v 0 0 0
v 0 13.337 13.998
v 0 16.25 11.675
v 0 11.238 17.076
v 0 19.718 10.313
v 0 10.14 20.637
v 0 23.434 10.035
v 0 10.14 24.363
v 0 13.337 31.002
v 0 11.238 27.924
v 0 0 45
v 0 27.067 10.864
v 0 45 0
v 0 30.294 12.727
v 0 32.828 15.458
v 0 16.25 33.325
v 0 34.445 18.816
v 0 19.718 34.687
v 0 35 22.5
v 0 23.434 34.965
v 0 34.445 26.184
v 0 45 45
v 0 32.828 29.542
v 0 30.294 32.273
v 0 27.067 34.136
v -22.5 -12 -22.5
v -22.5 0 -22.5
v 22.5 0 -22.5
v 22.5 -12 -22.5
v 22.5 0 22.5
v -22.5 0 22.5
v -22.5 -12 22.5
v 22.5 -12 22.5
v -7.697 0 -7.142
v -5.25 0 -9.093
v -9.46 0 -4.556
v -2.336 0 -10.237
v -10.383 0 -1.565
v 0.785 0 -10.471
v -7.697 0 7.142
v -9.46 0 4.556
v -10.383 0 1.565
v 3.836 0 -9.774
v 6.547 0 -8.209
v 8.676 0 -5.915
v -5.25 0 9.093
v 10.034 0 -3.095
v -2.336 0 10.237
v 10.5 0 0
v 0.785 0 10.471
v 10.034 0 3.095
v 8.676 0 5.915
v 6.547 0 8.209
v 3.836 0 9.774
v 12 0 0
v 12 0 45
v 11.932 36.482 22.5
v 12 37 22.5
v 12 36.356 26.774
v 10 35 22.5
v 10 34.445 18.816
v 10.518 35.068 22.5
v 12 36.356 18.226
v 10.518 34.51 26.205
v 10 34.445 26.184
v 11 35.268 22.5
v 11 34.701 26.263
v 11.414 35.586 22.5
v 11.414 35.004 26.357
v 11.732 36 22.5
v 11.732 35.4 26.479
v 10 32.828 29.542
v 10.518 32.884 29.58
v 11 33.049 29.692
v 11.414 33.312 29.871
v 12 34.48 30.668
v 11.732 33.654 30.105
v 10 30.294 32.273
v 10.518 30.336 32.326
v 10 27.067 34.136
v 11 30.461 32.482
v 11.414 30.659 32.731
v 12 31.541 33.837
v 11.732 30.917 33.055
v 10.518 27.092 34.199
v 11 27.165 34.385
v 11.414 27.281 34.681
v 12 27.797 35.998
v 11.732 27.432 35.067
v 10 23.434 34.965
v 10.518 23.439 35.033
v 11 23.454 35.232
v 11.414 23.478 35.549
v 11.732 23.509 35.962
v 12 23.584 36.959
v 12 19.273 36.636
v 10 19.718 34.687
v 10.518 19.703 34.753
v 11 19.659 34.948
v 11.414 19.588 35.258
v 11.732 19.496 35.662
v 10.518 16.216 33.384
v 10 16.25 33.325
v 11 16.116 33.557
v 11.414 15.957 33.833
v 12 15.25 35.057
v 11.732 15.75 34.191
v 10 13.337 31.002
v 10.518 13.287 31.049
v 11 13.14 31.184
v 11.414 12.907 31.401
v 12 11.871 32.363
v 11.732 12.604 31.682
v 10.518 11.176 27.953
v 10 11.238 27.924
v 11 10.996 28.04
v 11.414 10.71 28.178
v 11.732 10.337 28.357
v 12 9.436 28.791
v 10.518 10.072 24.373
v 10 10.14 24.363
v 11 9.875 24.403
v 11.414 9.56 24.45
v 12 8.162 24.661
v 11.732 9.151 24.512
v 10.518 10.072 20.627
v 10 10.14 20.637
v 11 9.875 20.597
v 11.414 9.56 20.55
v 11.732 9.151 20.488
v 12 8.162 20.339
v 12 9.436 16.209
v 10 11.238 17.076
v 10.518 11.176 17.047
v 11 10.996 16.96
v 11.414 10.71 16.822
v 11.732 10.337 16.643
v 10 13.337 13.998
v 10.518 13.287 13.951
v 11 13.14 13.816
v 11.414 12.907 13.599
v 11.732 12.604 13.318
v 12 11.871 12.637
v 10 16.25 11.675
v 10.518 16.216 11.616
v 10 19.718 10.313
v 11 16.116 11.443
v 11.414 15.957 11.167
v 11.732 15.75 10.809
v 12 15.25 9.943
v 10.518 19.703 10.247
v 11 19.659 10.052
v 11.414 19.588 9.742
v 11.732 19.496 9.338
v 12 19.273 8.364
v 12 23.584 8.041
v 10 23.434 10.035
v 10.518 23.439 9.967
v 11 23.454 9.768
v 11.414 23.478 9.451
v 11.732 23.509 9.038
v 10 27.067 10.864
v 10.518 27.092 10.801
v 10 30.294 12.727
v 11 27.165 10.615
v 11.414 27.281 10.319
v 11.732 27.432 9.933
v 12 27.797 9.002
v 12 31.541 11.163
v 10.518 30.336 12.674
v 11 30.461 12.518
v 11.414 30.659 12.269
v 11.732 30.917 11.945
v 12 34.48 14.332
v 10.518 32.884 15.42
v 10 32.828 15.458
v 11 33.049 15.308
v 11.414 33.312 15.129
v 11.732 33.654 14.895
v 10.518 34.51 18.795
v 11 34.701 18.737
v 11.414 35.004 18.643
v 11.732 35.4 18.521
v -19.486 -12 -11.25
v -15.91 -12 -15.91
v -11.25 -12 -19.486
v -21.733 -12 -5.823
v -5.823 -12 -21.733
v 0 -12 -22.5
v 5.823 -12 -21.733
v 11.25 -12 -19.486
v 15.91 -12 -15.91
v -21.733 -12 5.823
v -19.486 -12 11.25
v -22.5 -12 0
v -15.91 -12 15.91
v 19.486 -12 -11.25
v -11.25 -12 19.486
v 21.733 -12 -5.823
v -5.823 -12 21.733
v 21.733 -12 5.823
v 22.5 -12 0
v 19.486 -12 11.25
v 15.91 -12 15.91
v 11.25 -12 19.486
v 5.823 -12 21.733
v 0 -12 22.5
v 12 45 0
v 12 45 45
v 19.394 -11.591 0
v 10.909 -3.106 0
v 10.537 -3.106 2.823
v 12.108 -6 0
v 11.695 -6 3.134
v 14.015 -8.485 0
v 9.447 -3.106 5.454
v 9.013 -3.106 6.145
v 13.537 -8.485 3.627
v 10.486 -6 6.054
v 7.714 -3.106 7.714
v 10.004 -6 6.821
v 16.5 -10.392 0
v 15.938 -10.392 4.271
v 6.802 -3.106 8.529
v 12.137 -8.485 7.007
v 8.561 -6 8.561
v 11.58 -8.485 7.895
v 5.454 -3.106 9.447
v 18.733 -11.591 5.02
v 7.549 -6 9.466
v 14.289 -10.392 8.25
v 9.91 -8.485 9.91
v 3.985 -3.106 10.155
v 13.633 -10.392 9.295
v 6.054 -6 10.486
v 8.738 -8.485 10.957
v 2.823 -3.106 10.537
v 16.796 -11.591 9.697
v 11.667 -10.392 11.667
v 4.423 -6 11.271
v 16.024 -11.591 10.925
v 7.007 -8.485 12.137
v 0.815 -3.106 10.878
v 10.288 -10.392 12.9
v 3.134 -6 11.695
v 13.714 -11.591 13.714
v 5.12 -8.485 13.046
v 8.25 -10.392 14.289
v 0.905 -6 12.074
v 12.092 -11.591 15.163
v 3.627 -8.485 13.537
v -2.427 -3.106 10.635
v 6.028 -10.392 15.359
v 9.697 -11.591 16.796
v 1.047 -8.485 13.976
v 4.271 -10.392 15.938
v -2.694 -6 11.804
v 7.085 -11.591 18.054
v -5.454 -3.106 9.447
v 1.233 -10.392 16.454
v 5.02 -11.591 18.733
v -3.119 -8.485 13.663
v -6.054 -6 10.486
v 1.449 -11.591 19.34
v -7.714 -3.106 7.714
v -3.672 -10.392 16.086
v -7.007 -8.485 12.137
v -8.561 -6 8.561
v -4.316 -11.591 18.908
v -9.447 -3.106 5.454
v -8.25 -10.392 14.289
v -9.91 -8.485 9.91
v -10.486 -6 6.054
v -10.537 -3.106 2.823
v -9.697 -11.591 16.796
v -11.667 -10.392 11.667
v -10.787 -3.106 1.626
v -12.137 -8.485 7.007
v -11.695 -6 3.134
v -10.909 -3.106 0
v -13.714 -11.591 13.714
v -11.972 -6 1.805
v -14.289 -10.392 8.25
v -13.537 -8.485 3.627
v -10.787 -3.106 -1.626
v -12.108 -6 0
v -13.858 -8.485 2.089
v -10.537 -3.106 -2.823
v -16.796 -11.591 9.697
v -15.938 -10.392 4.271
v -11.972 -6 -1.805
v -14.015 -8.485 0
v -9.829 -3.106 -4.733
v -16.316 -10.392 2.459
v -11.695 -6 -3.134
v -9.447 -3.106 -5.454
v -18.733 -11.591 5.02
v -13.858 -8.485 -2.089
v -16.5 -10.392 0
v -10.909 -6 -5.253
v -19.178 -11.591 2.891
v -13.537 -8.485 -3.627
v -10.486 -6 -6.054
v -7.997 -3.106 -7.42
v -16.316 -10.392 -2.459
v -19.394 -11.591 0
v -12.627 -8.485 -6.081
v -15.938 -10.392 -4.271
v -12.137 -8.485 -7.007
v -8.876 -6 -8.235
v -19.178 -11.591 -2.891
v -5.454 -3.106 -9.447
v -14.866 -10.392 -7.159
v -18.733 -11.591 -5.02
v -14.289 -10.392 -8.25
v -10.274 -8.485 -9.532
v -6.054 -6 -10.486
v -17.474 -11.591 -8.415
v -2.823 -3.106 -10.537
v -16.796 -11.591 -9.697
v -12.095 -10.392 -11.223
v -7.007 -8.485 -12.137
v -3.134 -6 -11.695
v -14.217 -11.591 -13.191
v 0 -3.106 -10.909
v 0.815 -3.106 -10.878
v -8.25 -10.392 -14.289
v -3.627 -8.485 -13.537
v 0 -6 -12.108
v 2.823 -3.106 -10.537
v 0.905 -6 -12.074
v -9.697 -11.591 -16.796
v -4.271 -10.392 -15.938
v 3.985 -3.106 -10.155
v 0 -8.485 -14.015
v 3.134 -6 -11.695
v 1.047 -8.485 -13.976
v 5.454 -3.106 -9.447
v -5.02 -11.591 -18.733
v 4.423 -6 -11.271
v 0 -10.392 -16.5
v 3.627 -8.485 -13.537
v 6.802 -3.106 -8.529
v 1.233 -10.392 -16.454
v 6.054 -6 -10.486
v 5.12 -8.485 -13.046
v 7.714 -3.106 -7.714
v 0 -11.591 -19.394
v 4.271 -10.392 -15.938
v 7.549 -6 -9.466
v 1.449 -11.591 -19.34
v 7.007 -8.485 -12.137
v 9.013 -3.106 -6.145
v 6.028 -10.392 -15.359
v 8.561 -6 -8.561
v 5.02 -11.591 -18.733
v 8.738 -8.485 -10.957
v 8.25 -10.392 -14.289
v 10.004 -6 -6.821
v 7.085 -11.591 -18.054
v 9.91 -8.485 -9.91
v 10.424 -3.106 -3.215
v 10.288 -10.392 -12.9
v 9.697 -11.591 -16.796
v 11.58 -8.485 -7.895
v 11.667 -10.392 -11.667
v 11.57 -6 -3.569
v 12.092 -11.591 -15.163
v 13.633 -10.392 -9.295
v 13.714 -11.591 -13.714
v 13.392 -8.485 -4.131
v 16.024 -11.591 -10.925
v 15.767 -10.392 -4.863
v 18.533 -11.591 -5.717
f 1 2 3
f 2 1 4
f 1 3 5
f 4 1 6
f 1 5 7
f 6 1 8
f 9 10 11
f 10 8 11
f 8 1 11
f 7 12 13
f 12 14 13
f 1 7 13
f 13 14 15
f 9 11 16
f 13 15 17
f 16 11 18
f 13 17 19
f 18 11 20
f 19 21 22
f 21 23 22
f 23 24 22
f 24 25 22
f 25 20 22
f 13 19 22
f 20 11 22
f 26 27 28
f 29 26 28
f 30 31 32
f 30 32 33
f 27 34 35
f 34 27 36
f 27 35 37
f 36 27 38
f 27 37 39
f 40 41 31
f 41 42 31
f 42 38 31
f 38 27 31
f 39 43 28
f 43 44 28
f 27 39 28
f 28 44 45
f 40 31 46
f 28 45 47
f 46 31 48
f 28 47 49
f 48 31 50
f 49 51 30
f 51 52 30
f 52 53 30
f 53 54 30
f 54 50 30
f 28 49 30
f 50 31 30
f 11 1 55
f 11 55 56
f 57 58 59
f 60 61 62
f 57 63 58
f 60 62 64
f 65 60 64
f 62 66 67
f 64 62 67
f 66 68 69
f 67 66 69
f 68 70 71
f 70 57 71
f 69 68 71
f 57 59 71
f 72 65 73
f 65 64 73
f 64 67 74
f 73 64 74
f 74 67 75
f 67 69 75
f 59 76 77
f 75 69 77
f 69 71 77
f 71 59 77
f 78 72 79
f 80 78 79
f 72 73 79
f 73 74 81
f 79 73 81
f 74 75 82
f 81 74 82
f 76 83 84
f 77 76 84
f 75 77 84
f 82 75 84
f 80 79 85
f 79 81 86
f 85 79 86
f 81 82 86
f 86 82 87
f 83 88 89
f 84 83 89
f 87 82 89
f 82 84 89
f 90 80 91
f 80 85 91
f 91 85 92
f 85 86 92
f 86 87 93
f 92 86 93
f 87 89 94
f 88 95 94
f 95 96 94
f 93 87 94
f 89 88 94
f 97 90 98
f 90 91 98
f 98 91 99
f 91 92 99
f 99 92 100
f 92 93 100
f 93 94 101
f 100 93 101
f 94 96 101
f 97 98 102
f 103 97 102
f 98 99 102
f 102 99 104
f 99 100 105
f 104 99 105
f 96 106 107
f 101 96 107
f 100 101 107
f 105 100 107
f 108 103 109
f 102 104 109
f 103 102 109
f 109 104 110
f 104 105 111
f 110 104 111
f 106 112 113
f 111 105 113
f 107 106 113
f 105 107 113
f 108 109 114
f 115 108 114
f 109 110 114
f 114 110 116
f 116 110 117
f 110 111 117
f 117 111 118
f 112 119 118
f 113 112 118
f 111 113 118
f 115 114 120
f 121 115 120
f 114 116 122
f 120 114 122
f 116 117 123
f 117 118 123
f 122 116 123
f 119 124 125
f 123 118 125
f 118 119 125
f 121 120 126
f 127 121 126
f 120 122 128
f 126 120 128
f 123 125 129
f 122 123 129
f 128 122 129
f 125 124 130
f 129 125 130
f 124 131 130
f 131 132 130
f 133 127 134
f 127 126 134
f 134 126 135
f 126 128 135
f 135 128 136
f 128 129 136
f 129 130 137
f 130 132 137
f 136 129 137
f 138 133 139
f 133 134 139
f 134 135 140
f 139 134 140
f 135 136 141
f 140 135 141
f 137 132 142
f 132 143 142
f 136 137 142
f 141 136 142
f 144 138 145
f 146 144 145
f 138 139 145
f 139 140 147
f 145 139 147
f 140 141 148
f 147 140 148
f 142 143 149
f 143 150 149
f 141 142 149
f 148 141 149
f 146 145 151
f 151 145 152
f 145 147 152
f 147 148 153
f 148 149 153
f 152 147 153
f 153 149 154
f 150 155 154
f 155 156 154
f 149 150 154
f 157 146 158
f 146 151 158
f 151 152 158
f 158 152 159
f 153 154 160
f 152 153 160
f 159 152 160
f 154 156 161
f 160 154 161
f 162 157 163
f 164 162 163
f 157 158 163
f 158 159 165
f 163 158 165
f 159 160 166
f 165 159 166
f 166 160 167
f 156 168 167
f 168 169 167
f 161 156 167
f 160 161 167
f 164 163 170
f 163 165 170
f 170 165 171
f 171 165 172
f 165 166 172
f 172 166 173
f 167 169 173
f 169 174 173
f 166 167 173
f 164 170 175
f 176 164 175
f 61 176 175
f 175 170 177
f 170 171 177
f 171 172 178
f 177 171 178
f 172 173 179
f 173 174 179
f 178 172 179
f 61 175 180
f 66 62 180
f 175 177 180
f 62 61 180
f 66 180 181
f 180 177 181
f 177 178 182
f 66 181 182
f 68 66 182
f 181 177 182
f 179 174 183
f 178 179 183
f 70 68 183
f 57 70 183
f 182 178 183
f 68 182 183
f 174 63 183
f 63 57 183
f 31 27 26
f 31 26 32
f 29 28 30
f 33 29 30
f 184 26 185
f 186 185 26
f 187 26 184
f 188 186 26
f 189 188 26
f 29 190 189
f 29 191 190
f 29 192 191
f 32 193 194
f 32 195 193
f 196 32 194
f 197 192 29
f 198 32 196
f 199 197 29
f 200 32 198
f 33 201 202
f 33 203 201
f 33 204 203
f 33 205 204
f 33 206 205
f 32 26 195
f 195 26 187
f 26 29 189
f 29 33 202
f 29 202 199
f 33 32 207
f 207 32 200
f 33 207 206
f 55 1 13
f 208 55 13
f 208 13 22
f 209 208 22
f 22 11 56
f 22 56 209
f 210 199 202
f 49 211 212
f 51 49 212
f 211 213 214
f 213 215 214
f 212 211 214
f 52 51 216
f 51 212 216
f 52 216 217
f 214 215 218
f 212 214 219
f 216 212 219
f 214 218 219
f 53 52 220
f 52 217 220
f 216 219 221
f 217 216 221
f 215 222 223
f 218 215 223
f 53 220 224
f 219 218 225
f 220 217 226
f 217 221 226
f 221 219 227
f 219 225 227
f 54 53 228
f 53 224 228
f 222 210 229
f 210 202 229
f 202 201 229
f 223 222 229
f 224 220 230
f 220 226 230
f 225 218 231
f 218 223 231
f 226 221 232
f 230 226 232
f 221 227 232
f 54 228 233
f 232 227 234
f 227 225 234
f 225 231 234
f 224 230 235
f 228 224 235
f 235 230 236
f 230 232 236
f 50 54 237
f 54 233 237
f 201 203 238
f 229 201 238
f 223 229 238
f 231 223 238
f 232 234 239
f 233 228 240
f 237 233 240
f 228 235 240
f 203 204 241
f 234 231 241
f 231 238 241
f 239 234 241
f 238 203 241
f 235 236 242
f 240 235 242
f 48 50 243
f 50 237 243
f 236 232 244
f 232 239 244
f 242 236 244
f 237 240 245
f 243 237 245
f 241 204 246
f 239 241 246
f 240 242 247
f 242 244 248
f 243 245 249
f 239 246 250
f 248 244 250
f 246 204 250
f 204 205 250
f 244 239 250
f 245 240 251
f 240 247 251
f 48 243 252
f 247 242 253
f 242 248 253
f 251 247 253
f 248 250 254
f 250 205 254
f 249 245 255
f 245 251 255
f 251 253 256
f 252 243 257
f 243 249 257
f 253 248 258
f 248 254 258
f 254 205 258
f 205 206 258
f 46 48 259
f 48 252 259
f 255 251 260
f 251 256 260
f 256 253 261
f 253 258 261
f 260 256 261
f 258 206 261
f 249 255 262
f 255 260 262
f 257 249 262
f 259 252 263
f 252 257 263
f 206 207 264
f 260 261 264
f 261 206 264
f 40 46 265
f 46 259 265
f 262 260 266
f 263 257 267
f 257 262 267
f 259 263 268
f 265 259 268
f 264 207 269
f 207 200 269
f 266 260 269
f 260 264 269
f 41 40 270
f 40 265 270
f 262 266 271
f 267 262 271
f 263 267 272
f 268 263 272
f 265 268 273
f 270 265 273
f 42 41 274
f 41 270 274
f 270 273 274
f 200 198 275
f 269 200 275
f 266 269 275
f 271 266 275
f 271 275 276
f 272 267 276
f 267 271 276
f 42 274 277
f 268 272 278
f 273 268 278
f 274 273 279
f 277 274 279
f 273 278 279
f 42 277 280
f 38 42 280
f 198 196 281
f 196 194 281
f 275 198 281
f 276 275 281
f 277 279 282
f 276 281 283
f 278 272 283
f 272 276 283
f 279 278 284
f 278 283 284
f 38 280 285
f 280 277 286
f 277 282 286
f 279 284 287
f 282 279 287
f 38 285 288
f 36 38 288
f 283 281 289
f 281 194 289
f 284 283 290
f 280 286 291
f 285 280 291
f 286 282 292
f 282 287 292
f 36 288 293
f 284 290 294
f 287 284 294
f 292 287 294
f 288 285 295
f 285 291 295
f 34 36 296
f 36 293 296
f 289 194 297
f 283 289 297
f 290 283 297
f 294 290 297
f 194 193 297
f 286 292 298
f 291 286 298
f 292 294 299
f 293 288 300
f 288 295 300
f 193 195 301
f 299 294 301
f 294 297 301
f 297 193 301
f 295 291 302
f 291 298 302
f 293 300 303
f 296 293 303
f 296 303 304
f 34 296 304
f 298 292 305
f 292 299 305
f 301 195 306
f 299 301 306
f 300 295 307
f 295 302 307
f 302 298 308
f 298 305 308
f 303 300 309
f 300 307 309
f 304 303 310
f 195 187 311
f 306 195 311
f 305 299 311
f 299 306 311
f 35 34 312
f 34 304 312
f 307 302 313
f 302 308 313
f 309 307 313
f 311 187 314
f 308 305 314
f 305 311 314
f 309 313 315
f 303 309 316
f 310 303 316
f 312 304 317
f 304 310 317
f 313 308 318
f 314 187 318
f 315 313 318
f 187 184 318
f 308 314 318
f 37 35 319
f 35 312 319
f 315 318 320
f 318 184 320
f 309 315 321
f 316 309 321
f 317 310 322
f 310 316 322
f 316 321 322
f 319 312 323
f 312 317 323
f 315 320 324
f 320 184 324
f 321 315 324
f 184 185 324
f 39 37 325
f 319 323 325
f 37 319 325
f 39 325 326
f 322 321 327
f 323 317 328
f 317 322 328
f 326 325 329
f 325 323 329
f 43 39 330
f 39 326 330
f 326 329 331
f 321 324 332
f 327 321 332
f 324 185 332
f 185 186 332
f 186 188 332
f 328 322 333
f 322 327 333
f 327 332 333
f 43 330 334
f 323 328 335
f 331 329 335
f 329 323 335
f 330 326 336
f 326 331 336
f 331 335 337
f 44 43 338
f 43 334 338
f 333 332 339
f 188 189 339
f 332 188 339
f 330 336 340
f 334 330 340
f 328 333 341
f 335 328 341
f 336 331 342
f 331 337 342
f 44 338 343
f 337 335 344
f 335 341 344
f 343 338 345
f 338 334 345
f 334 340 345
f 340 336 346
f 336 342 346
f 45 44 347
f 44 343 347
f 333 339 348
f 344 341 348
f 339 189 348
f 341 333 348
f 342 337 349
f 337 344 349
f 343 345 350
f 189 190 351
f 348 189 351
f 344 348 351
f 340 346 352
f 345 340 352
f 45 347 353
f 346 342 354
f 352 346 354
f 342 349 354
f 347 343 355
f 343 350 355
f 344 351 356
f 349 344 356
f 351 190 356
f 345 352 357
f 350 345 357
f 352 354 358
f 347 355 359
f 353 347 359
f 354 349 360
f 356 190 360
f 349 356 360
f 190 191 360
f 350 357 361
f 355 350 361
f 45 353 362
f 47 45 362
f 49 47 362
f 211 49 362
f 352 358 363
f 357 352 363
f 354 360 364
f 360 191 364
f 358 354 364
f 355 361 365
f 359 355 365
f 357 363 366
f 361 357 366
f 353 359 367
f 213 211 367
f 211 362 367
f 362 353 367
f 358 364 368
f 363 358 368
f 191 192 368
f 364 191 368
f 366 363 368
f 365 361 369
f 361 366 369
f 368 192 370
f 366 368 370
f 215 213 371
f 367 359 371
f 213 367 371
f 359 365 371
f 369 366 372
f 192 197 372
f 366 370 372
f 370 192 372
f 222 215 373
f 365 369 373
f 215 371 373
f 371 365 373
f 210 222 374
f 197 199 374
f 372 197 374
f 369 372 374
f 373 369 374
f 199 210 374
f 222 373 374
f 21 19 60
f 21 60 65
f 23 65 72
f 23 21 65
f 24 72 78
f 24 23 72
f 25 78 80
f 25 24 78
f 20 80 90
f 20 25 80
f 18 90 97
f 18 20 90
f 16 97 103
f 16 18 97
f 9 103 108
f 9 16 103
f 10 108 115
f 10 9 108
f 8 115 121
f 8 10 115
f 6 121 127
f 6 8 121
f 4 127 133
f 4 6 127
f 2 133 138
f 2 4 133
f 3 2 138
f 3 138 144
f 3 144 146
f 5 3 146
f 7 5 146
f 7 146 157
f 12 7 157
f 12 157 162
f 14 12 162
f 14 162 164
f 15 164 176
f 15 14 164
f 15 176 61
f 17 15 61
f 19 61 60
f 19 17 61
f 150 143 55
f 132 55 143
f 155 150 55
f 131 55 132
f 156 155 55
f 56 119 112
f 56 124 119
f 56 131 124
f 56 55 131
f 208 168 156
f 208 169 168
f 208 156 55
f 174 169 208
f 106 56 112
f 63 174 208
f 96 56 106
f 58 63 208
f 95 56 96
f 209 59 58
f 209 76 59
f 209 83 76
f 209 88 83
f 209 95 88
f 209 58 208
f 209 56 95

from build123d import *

# Parameters (mm, degrees)
F0_W     = 45
F0_H     = 45
F0_R     = 10.5
F1_DEPTH = 12
F2_R     = 11.99999
F3_W     = 45
F3_H     = 45
F3_R     = 12.5
F4_DEPTH = 12
F5_R     = 2


# Not quite as in the source:
# - a fillet or chamfer is up to 0.001 mm smaller than in the source, because OpenCascade refuses the exact size


with BuildPart() as f1:
    # F0 (on Front) → F1 (new body)
    with BuildSketch(Plane.XZ):
        Rectangle(F0_W, F0_H)
        Circle(F0_R, mode=Mode.SUBTRACT)
    extrude(amount=F1_DEPTH)

    # F2 (radius 12 in the source; OpenCascade refuses exactly that, so slightly less here)
    f2_edges = [f1.edges().sort_by_distance(p)[0] for p in [
        (-10.5, -12, 0),
    ]]
    fillet(f2_edges, radius=F2_R)


with BuildPart() as f4:
    # F3 (on Right) → F4 (new body)
    with BuildSketch(Plane.YZ):
        with Locations((22.5, 22.5)):
            Rectangle(F3_W, F3_H)
        with Locations((22.5, 22.5)):
            Circle(F3_R, mode=Mode.SUBTRACT)
    extrude(amount=F4_DEPTH)

    # F5
    f5_edges = [f4.edges().sort_by_distance(p)[0] for p in [
        (12, 10, 22.5),
    ]]
    fillet(f5_edges, radius=F5_R)


solid = Compound([f1.part, f4.part])
